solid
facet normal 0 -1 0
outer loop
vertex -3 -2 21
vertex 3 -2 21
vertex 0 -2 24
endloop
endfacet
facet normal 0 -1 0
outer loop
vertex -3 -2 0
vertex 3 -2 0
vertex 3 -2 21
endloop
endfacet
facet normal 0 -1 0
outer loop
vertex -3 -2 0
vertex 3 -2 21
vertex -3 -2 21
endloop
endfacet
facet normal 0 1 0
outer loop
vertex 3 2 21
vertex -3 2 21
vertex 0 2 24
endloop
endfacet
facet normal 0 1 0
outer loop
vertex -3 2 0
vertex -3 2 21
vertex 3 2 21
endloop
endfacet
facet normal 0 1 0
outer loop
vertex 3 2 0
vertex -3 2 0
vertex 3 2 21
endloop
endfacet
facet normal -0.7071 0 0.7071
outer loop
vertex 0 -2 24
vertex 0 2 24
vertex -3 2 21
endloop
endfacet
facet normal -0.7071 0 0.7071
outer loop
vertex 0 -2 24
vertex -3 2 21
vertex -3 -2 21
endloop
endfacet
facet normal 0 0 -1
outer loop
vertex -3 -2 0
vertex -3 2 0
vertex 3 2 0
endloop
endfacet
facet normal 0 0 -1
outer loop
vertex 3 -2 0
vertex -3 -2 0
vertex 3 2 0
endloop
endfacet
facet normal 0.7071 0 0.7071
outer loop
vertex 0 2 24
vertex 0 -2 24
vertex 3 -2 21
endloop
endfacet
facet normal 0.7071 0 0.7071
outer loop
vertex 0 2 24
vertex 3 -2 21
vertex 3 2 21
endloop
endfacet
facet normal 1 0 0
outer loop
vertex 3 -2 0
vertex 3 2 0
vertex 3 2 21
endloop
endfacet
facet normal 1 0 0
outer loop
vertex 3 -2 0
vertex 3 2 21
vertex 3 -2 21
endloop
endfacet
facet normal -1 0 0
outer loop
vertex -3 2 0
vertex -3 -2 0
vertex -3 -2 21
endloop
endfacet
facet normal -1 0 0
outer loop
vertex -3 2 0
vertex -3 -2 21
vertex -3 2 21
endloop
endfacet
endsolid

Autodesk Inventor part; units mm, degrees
ref_plane "YZ Plane" through (0, 0, 0) normal (1, 0, 0) x (0, 1, 0)
ref_plane "XZ Plane" through (0, 0, 0) normal (0, 1, 0) x (-1, 0, 0)
ref_plane "XY Plane" through (0, 0, 0) normal (0, 0, 1) x (1, 0, 0)
sketch "Esboço1" plane through (0, 0, 0) normal (0, 0, 1) x (1, 0, 0)
  line L0 (-3, 2) -> (3, 2)
  line L1 (3, 2) -> (3, -2)
  line L2 (3, -2) -> (-3, -2)
  line L3 (-3, -2) -> (-3, 2)
  line L4 (-3, 2) -> (3, -2) construction
  line L5 (3, 2) -> (-3, -2) construction
  point P0 (0, 0)
  dimension "d0" = 6
  dimension "d1" = 4
extrude "Extrusão1" add sketch "Esboço1" along normal blind 24
chamfer "Chanfro1" distance 3 angle 45 2 edges at (3, 0, 24) (-3, 0, 24)
properties part number "PEÇA MOVEL"
